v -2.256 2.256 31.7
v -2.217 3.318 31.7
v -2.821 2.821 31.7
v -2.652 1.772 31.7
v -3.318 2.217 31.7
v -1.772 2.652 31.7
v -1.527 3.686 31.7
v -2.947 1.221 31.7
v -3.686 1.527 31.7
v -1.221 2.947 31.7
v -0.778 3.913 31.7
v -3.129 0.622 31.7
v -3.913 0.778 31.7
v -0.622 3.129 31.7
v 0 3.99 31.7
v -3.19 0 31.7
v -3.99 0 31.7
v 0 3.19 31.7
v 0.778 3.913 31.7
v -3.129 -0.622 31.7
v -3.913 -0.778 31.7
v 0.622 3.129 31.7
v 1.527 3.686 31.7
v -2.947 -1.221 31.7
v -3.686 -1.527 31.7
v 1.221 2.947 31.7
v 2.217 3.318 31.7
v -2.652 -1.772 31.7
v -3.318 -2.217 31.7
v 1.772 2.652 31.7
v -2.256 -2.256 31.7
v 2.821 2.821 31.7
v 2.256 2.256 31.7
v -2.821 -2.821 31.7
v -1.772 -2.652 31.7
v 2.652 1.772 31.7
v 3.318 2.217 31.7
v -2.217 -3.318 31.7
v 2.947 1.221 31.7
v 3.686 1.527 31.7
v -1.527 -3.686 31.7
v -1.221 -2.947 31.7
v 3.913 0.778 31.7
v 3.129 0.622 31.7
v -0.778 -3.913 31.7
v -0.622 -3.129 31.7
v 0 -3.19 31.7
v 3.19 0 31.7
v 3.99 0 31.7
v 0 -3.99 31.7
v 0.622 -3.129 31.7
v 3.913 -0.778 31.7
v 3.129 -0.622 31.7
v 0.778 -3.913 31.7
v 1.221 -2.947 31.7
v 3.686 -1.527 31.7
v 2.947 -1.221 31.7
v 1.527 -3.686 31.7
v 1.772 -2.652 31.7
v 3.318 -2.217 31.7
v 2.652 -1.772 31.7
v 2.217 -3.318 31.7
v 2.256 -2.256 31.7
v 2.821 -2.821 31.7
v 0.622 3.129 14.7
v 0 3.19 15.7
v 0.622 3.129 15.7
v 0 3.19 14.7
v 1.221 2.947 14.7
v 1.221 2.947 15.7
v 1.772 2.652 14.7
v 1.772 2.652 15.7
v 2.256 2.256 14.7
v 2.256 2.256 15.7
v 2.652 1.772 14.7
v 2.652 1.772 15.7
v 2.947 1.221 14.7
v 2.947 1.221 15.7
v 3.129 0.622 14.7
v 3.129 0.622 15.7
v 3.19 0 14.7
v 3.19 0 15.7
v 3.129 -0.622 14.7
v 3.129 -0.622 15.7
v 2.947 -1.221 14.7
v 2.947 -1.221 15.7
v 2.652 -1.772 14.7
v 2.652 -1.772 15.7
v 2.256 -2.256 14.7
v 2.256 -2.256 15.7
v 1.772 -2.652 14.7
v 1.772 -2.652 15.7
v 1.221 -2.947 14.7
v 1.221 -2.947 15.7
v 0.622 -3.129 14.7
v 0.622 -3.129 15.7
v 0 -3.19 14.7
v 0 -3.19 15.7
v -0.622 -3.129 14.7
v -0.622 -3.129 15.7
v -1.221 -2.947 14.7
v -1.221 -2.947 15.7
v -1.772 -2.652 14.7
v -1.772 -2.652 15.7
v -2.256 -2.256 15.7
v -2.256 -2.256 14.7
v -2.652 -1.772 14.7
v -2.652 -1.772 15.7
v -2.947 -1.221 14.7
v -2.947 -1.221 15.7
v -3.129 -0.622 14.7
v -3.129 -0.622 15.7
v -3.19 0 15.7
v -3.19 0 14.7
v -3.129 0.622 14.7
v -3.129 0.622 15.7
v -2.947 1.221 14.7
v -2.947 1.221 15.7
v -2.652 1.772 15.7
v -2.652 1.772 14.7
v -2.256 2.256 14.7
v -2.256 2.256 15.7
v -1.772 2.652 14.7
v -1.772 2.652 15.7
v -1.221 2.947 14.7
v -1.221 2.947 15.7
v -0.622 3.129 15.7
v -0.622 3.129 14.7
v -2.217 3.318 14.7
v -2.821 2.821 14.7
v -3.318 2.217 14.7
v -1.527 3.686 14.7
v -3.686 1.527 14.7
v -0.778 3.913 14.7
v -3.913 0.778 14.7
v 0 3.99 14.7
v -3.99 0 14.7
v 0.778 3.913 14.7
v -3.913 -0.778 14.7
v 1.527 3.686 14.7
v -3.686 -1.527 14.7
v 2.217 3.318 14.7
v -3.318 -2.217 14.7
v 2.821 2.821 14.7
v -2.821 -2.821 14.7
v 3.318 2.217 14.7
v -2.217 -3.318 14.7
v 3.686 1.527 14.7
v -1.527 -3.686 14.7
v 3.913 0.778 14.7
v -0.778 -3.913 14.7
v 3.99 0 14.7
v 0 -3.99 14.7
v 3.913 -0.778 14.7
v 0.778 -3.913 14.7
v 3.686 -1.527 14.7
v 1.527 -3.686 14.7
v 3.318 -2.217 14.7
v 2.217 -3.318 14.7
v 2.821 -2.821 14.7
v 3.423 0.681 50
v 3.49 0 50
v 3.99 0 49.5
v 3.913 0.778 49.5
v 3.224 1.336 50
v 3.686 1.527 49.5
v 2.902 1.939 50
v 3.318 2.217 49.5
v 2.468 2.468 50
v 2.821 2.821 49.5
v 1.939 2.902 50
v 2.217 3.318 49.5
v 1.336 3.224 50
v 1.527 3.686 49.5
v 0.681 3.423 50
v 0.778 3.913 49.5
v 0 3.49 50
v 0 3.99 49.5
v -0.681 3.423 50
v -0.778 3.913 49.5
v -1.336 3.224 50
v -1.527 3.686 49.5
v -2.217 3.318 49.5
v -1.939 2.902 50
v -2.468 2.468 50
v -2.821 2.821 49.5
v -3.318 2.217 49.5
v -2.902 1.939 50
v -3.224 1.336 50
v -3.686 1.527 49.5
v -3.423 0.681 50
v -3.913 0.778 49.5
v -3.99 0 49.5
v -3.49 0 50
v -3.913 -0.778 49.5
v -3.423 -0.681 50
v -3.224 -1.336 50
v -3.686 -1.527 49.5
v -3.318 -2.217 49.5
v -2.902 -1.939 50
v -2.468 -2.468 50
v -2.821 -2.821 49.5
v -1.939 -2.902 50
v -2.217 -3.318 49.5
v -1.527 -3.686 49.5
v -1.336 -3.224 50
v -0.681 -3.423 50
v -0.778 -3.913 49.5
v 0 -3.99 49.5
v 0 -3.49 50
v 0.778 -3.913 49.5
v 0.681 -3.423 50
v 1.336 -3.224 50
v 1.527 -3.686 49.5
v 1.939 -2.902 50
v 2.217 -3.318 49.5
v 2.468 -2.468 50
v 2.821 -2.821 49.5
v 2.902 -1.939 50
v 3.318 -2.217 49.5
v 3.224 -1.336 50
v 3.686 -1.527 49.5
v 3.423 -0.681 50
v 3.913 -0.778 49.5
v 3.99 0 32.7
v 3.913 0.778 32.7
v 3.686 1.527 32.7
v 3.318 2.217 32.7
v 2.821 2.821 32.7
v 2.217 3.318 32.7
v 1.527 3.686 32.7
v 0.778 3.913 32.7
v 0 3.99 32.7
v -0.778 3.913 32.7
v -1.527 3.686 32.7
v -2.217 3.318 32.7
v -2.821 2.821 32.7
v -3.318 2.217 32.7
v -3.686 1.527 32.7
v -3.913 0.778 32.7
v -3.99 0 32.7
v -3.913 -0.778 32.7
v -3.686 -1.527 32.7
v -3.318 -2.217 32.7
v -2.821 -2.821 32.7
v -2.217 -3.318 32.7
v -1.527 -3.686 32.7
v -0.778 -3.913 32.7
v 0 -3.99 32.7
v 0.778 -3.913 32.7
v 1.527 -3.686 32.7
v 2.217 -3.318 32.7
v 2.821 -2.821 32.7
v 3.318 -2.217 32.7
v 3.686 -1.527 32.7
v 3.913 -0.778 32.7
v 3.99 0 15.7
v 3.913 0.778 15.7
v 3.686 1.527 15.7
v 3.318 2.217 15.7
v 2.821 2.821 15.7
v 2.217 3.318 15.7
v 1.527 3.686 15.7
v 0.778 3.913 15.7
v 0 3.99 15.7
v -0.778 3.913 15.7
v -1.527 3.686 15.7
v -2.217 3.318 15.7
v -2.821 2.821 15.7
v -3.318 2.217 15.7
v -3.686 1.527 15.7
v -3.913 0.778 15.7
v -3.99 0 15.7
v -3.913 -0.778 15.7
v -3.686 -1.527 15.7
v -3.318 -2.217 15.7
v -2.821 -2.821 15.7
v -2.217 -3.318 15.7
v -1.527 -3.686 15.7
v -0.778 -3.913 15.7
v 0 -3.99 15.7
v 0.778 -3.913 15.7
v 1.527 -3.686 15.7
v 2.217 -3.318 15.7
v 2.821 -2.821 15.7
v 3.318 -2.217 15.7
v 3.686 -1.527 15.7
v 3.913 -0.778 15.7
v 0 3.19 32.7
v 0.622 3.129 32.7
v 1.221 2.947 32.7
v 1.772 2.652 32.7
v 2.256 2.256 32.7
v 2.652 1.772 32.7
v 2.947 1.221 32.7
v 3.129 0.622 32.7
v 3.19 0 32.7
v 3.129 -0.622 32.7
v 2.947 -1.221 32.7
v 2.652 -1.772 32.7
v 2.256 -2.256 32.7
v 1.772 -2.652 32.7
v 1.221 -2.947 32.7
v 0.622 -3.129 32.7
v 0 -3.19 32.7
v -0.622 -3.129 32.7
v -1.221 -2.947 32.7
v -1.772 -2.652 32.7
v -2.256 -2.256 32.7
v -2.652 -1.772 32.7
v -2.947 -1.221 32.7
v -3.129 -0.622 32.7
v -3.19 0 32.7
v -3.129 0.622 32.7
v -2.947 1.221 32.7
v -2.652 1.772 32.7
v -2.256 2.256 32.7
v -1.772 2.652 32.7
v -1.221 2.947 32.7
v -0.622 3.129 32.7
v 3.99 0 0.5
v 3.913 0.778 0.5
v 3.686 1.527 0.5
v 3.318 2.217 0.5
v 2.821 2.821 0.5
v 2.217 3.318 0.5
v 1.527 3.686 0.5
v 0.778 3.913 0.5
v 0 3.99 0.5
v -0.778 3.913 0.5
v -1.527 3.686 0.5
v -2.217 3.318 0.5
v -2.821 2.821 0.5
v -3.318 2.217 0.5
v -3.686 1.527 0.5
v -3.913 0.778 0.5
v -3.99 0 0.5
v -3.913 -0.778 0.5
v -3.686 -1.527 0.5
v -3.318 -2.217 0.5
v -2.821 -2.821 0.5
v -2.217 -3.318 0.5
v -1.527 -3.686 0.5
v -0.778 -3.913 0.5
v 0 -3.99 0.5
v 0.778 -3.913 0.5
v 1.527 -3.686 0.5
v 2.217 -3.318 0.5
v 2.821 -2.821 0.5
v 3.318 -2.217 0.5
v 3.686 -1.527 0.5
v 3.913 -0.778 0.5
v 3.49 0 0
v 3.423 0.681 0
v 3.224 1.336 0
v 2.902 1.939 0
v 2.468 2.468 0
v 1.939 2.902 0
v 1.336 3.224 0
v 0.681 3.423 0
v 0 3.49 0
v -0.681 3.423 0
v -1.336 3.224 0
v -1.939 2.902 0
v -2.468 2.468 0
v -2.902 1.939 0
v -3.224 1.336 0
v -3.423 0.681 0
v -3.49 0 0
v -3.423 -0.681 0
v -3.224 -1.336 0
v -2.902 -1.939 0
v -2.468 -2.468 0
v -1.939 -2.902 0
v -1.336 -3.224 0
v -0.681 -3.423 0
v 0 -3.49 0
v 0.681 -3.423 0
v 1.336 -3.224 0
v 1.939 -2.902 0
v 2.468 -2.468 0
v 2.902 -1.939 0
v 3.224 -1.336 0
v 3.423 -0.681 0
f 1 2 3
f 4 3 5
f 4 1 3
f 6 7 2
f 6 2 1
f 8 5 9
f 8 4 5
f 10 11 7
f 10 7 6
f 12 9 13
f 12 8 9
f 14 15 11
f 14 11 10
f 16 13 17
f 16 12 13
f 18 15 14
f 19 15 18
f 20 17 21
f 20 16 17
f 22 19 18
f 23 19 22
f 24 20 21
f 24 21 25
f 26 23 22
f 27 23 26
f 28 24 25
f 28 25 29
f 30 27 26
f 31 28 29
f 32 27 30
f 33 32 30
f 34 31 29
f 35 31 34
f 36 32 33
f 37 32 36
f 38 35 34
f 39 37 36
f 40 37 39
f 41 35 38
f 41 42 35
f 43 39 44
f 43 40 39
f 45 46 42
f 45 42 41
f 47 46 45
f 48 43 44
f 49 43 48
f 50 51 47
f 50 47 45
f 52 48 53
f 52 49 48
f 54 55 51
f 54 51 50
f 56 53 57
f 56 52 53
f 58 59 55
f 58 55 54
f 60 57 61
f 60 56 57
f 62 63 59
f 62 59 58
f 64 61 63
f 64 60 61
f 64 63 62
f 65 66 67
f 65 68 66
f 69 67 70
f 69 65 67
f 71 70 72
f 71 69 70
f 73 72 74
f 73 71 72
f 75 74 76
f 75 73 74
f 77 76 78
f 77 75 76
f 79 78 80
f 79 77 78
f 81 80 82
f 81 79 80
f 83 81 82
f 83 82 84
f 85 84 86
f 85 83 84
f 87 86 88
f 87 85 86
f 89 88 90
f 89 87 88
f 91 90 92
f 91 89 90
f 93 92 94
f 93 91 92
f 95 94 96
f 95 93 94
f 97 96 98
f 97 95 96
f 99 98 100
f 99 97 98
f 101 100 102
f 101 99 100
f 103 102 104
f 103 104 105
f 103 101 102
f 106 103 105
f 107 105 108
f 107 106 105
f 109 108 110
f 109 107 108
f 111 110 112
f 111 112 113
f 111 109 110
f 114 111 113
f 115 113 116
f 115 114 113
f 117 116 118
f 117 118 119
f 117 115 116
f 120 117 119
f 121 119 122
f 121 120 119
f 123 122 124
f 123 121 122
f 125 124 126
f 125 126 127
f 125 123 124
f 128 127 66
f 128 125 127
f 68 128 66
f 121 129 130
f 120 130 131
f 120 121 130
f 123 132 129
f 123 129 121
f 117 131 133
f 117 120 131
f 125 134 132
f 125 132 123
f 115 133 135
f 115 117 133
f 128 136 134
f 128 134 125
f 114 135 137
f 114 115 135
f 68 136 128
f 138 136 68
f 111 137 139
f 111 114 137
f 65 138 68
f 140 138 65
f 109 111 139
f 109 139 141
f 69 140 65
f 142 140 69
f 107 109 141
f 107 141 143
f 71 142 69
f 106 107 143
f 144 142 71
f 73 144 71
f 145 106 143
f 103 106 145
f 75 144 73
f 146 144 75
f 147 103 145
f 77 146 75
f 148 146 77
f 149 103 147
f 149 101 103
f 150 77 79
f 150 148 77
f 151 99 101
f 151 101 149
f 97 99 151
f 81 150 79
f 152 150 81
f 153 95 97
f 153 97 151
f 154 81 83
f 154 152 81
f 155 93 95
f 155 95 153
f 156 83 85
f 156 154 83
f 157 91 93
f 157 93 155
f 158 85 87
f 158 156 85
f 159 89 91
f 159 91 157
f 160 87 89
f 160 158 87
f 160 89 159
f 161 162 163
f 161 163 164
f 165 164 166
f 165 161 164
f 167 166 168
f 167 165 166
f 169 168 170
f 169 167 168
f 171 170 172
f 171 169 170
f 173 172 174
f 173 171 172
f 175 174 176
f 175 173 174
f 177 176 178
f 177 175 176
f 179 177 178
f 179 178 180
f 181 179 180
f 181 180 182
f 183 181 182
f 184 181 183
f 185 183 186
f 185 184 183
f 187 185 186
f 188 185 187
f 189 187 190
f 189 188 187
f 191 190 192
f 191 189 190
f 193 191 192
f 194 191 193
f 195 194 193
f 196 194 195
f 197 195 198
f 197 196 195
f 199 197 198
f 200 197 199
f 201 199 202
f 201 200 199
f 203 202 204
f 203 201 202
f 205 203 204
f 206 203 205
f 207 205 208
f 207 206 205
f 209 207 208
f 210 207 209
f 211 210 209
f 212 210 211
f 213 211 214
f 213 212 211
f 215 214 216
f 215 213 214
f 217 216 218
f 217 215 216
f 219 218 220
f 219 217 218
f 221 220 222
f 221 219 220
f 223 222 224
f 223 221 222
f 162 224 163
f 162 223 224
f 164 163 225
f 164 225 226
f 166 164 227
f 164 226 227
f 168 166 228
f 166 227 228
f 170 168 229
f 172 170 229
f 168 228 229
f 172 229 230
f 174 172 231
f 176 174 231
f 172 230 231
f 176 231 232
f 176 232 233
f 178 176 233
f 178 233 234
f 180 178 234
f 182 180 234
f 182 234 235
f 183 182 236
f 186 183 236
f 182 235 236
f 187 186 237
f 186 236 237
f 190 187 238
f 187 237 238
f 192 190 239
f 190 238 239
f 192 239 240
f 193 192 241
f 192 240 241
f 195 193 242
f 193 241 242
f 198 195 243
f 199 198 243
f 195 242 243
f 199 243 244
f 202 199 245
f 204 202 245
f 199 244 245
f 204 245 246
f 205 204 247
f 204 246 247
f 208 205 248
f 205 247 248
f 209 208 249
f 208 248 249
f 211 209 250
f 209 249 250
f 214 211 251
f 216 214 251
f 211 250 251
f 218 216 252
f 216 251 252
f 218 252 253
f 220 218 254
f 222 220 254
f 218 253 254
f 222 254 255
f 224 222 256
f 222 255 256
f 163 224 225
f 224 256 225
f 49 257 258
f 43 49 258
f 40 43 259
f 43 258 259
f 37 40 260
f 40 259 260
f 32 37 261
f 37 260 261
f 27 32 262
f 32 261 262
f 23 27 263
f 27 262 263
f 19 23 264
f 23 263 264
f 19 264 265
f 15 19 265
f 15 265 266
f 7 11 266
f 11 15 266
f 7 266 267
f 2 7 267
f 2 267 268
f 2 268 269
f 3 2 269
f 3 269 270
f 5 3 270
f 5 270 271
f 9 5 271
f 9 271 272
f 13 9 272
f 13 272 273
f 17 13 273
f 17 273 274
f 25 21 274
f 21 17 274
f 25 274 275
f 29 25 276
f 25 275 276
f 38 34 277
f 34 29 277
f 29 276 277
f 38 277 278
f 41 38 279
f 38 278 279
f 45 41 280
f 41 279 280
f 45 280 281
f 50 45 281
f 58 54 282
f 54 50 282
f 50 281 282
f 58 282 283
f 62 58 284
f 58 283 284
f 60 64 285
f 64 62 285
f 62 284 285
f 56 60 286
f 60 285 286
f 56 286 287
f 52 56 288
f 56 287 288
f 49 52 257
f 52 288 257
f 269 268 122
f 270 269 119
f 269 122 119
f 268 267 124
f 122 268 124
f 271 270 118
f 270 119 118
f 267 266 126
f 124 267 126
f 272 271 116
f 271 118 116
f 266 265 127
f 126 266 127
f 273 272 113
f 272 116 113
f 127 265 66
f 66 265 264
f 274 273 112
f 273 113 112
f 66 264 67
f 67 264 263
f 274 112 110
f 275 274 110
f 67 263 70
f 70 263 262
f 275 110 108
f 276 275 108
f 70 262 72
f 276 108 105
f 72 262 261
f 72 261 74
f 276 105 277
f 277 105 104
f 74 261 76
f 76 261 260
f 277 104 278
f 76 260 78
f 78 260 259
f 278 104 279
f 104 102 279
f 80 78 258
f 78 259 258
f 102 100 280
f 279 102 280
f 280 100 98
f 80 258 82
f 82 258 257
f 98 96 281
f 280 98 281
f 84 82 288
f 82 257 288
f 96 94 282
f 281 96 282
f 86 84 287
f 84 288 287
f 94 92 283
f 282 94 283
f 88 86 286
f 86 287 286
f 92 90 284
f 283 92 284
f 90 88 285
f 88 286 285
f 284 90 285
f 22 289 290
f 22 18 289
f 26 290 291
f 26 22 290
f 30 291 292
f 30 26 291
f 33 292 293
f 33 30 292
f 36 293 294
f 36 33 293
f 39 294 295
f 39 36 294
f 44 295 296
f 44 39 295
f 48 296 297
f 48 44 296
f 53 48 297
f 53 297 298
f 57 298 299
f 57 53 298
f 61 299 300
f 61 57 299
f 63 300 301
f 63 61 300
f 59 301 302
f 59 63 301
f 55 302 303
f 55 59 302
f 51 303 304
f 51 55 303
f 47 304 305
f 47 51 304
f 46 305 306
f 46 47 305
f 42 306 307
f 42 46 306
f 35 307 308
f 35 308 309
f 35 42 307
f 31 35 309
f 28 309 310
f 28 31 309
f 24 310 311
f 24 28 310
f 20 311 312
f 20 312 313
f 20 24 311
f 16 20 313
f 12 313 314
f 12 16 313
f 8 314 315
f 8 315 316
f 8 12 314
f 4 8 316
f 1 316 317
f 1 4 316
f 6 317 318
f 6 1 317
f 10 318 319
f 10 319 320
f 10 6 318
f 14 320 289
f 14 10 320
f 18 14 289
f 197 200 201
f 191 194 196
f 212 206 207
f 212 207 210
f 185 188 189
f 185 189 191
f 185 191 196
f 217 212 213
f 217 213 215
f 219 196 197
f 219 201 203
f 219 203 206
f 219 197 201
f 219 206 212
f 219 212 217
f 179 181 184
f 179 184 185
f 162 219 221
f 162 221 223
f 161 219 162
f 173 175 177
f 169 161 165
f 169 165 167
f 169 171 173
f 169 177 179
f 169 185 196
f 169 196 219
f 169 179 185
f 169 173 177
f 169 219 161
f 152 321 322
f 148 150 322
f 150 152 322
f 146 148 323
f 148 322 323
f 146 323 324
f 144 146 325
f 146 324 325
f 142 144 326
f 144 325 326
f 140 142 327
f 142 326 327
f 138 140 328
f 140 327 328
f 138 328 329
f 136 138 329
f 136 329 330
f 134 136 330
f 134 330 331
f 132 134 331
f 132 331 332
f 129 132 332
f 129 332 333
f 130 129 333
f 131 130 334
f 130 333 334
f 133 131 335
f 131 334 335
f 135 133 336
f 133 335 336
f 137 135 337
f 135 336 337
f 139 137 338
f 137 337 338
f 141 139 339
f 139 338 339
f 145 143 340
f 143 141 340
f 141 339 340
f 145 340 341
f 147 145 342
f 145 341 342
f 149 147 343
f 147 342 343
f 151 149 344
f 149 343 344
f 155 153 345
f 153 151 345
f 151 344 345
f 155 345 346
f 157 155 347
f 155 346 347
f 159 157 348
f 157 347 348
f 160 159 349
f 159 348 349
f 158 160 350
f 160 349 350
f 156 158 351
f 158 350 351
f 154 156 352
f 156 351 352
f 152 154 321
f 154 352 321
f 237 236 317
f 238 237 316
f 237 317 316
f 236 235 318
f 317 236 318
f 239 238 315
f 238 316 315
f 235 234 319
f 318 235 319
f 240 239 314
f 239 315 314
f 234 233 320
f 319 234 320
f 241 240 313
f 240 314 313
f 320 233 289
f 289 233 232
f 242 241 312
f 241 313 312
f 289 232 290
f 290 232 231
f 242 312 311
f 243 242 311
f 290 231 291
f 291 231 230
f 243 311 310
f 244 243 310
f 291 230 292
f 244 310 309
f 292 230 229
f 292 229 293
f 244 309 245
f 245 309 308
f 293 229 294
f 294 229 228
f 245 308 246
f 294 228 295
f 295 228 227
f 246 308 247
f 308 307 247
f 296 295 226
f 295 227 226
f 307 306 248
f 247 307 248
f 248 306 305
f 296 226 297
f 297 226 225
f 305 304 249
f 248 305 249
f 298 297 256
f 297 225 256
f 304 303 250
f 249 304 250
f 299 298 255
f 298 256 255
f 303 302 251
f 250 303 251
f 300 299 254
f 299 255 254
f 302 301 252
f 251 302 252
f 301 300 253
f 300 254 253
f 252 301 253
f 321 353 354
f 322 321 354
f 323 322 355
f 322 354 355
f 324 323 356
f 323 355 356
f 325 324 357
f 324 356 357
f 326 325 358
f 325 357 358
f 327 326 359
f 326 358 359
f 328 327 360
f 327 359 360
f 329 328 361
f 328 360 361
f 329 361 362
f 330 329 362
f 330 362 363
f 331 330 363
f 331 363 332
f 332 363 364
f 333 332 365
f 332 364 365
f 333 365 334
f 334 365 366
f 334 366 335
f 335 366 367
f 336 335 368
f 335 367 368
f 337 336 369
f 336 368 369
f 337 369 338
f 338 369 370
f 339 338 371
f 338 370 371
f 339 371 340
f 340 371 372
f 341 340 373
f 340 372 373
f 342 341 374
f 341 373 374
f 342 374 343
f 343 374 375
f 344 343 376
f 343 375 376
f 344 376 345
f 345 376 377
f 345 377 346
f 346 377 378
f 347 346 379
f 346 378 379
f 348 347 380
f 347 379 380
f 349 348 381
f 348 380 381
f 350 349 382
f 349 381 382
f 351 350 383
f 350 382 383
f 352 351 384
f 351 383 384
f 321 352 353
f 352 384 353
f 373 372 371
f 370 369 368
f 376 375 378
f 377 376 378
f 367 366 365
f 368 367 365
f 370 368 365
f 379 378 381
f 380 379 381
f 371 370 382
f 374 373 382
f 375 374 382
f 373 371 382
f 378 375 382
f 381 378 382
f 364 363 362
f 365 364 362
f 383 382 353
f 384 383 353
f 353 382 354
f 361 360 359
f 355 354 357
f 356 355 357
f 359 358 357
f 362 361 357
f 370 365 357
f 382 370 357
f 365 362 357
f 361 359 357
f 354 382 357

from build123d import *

# Parameters (mm, degrees)
CROQUIS1_R              = 3.99
SALIENTE_EXTRUIR1_DEPTH = 50
CROQUIS2_W              = 1
CROQUIS2_H              = 0.8
CHAFL_N1_SIZE           = 0.5


with BuildPart() as part:
    # Croquis1 → Saliente-Extruir1 (new body)
    with BuildSketch(Plane.XY):
        Circle(CROQUIS1_R)
    extrude(amount=SALIENTE_EXTRUIR1_DEPTH)

    # Croquis2 → Cortar-Revolución1 (revolve, cut)
    with BuildSketch(Plane(origin=(0, 0, 0), x_dir=(0, 0, -1), z_dir=(1, 0, 0))):
        with Locations((-15.2, 3.59)):
            Rectangle(CROQUIS2_W, CROQUIS2_H)
        with Locations((-32.2, 3.59)):
            Rectangle(CROQUIS2_W, CROQUIS2_H)
    revolve(axis=Axis((0, 0, 50), (0, 0, -1)), mode=Mode.SUBTRACT)

    # Chaflán1
    chafl_n1_edges = [part.edges().sort_by_distance(p)[0] for p in [
        (-3.99, 0, 0),
        (-3.99, 0, 50),
    ]]
    chamfer(chafl_n1_edges, length=CHAFL_N1_SIZE)


solid = part.part
